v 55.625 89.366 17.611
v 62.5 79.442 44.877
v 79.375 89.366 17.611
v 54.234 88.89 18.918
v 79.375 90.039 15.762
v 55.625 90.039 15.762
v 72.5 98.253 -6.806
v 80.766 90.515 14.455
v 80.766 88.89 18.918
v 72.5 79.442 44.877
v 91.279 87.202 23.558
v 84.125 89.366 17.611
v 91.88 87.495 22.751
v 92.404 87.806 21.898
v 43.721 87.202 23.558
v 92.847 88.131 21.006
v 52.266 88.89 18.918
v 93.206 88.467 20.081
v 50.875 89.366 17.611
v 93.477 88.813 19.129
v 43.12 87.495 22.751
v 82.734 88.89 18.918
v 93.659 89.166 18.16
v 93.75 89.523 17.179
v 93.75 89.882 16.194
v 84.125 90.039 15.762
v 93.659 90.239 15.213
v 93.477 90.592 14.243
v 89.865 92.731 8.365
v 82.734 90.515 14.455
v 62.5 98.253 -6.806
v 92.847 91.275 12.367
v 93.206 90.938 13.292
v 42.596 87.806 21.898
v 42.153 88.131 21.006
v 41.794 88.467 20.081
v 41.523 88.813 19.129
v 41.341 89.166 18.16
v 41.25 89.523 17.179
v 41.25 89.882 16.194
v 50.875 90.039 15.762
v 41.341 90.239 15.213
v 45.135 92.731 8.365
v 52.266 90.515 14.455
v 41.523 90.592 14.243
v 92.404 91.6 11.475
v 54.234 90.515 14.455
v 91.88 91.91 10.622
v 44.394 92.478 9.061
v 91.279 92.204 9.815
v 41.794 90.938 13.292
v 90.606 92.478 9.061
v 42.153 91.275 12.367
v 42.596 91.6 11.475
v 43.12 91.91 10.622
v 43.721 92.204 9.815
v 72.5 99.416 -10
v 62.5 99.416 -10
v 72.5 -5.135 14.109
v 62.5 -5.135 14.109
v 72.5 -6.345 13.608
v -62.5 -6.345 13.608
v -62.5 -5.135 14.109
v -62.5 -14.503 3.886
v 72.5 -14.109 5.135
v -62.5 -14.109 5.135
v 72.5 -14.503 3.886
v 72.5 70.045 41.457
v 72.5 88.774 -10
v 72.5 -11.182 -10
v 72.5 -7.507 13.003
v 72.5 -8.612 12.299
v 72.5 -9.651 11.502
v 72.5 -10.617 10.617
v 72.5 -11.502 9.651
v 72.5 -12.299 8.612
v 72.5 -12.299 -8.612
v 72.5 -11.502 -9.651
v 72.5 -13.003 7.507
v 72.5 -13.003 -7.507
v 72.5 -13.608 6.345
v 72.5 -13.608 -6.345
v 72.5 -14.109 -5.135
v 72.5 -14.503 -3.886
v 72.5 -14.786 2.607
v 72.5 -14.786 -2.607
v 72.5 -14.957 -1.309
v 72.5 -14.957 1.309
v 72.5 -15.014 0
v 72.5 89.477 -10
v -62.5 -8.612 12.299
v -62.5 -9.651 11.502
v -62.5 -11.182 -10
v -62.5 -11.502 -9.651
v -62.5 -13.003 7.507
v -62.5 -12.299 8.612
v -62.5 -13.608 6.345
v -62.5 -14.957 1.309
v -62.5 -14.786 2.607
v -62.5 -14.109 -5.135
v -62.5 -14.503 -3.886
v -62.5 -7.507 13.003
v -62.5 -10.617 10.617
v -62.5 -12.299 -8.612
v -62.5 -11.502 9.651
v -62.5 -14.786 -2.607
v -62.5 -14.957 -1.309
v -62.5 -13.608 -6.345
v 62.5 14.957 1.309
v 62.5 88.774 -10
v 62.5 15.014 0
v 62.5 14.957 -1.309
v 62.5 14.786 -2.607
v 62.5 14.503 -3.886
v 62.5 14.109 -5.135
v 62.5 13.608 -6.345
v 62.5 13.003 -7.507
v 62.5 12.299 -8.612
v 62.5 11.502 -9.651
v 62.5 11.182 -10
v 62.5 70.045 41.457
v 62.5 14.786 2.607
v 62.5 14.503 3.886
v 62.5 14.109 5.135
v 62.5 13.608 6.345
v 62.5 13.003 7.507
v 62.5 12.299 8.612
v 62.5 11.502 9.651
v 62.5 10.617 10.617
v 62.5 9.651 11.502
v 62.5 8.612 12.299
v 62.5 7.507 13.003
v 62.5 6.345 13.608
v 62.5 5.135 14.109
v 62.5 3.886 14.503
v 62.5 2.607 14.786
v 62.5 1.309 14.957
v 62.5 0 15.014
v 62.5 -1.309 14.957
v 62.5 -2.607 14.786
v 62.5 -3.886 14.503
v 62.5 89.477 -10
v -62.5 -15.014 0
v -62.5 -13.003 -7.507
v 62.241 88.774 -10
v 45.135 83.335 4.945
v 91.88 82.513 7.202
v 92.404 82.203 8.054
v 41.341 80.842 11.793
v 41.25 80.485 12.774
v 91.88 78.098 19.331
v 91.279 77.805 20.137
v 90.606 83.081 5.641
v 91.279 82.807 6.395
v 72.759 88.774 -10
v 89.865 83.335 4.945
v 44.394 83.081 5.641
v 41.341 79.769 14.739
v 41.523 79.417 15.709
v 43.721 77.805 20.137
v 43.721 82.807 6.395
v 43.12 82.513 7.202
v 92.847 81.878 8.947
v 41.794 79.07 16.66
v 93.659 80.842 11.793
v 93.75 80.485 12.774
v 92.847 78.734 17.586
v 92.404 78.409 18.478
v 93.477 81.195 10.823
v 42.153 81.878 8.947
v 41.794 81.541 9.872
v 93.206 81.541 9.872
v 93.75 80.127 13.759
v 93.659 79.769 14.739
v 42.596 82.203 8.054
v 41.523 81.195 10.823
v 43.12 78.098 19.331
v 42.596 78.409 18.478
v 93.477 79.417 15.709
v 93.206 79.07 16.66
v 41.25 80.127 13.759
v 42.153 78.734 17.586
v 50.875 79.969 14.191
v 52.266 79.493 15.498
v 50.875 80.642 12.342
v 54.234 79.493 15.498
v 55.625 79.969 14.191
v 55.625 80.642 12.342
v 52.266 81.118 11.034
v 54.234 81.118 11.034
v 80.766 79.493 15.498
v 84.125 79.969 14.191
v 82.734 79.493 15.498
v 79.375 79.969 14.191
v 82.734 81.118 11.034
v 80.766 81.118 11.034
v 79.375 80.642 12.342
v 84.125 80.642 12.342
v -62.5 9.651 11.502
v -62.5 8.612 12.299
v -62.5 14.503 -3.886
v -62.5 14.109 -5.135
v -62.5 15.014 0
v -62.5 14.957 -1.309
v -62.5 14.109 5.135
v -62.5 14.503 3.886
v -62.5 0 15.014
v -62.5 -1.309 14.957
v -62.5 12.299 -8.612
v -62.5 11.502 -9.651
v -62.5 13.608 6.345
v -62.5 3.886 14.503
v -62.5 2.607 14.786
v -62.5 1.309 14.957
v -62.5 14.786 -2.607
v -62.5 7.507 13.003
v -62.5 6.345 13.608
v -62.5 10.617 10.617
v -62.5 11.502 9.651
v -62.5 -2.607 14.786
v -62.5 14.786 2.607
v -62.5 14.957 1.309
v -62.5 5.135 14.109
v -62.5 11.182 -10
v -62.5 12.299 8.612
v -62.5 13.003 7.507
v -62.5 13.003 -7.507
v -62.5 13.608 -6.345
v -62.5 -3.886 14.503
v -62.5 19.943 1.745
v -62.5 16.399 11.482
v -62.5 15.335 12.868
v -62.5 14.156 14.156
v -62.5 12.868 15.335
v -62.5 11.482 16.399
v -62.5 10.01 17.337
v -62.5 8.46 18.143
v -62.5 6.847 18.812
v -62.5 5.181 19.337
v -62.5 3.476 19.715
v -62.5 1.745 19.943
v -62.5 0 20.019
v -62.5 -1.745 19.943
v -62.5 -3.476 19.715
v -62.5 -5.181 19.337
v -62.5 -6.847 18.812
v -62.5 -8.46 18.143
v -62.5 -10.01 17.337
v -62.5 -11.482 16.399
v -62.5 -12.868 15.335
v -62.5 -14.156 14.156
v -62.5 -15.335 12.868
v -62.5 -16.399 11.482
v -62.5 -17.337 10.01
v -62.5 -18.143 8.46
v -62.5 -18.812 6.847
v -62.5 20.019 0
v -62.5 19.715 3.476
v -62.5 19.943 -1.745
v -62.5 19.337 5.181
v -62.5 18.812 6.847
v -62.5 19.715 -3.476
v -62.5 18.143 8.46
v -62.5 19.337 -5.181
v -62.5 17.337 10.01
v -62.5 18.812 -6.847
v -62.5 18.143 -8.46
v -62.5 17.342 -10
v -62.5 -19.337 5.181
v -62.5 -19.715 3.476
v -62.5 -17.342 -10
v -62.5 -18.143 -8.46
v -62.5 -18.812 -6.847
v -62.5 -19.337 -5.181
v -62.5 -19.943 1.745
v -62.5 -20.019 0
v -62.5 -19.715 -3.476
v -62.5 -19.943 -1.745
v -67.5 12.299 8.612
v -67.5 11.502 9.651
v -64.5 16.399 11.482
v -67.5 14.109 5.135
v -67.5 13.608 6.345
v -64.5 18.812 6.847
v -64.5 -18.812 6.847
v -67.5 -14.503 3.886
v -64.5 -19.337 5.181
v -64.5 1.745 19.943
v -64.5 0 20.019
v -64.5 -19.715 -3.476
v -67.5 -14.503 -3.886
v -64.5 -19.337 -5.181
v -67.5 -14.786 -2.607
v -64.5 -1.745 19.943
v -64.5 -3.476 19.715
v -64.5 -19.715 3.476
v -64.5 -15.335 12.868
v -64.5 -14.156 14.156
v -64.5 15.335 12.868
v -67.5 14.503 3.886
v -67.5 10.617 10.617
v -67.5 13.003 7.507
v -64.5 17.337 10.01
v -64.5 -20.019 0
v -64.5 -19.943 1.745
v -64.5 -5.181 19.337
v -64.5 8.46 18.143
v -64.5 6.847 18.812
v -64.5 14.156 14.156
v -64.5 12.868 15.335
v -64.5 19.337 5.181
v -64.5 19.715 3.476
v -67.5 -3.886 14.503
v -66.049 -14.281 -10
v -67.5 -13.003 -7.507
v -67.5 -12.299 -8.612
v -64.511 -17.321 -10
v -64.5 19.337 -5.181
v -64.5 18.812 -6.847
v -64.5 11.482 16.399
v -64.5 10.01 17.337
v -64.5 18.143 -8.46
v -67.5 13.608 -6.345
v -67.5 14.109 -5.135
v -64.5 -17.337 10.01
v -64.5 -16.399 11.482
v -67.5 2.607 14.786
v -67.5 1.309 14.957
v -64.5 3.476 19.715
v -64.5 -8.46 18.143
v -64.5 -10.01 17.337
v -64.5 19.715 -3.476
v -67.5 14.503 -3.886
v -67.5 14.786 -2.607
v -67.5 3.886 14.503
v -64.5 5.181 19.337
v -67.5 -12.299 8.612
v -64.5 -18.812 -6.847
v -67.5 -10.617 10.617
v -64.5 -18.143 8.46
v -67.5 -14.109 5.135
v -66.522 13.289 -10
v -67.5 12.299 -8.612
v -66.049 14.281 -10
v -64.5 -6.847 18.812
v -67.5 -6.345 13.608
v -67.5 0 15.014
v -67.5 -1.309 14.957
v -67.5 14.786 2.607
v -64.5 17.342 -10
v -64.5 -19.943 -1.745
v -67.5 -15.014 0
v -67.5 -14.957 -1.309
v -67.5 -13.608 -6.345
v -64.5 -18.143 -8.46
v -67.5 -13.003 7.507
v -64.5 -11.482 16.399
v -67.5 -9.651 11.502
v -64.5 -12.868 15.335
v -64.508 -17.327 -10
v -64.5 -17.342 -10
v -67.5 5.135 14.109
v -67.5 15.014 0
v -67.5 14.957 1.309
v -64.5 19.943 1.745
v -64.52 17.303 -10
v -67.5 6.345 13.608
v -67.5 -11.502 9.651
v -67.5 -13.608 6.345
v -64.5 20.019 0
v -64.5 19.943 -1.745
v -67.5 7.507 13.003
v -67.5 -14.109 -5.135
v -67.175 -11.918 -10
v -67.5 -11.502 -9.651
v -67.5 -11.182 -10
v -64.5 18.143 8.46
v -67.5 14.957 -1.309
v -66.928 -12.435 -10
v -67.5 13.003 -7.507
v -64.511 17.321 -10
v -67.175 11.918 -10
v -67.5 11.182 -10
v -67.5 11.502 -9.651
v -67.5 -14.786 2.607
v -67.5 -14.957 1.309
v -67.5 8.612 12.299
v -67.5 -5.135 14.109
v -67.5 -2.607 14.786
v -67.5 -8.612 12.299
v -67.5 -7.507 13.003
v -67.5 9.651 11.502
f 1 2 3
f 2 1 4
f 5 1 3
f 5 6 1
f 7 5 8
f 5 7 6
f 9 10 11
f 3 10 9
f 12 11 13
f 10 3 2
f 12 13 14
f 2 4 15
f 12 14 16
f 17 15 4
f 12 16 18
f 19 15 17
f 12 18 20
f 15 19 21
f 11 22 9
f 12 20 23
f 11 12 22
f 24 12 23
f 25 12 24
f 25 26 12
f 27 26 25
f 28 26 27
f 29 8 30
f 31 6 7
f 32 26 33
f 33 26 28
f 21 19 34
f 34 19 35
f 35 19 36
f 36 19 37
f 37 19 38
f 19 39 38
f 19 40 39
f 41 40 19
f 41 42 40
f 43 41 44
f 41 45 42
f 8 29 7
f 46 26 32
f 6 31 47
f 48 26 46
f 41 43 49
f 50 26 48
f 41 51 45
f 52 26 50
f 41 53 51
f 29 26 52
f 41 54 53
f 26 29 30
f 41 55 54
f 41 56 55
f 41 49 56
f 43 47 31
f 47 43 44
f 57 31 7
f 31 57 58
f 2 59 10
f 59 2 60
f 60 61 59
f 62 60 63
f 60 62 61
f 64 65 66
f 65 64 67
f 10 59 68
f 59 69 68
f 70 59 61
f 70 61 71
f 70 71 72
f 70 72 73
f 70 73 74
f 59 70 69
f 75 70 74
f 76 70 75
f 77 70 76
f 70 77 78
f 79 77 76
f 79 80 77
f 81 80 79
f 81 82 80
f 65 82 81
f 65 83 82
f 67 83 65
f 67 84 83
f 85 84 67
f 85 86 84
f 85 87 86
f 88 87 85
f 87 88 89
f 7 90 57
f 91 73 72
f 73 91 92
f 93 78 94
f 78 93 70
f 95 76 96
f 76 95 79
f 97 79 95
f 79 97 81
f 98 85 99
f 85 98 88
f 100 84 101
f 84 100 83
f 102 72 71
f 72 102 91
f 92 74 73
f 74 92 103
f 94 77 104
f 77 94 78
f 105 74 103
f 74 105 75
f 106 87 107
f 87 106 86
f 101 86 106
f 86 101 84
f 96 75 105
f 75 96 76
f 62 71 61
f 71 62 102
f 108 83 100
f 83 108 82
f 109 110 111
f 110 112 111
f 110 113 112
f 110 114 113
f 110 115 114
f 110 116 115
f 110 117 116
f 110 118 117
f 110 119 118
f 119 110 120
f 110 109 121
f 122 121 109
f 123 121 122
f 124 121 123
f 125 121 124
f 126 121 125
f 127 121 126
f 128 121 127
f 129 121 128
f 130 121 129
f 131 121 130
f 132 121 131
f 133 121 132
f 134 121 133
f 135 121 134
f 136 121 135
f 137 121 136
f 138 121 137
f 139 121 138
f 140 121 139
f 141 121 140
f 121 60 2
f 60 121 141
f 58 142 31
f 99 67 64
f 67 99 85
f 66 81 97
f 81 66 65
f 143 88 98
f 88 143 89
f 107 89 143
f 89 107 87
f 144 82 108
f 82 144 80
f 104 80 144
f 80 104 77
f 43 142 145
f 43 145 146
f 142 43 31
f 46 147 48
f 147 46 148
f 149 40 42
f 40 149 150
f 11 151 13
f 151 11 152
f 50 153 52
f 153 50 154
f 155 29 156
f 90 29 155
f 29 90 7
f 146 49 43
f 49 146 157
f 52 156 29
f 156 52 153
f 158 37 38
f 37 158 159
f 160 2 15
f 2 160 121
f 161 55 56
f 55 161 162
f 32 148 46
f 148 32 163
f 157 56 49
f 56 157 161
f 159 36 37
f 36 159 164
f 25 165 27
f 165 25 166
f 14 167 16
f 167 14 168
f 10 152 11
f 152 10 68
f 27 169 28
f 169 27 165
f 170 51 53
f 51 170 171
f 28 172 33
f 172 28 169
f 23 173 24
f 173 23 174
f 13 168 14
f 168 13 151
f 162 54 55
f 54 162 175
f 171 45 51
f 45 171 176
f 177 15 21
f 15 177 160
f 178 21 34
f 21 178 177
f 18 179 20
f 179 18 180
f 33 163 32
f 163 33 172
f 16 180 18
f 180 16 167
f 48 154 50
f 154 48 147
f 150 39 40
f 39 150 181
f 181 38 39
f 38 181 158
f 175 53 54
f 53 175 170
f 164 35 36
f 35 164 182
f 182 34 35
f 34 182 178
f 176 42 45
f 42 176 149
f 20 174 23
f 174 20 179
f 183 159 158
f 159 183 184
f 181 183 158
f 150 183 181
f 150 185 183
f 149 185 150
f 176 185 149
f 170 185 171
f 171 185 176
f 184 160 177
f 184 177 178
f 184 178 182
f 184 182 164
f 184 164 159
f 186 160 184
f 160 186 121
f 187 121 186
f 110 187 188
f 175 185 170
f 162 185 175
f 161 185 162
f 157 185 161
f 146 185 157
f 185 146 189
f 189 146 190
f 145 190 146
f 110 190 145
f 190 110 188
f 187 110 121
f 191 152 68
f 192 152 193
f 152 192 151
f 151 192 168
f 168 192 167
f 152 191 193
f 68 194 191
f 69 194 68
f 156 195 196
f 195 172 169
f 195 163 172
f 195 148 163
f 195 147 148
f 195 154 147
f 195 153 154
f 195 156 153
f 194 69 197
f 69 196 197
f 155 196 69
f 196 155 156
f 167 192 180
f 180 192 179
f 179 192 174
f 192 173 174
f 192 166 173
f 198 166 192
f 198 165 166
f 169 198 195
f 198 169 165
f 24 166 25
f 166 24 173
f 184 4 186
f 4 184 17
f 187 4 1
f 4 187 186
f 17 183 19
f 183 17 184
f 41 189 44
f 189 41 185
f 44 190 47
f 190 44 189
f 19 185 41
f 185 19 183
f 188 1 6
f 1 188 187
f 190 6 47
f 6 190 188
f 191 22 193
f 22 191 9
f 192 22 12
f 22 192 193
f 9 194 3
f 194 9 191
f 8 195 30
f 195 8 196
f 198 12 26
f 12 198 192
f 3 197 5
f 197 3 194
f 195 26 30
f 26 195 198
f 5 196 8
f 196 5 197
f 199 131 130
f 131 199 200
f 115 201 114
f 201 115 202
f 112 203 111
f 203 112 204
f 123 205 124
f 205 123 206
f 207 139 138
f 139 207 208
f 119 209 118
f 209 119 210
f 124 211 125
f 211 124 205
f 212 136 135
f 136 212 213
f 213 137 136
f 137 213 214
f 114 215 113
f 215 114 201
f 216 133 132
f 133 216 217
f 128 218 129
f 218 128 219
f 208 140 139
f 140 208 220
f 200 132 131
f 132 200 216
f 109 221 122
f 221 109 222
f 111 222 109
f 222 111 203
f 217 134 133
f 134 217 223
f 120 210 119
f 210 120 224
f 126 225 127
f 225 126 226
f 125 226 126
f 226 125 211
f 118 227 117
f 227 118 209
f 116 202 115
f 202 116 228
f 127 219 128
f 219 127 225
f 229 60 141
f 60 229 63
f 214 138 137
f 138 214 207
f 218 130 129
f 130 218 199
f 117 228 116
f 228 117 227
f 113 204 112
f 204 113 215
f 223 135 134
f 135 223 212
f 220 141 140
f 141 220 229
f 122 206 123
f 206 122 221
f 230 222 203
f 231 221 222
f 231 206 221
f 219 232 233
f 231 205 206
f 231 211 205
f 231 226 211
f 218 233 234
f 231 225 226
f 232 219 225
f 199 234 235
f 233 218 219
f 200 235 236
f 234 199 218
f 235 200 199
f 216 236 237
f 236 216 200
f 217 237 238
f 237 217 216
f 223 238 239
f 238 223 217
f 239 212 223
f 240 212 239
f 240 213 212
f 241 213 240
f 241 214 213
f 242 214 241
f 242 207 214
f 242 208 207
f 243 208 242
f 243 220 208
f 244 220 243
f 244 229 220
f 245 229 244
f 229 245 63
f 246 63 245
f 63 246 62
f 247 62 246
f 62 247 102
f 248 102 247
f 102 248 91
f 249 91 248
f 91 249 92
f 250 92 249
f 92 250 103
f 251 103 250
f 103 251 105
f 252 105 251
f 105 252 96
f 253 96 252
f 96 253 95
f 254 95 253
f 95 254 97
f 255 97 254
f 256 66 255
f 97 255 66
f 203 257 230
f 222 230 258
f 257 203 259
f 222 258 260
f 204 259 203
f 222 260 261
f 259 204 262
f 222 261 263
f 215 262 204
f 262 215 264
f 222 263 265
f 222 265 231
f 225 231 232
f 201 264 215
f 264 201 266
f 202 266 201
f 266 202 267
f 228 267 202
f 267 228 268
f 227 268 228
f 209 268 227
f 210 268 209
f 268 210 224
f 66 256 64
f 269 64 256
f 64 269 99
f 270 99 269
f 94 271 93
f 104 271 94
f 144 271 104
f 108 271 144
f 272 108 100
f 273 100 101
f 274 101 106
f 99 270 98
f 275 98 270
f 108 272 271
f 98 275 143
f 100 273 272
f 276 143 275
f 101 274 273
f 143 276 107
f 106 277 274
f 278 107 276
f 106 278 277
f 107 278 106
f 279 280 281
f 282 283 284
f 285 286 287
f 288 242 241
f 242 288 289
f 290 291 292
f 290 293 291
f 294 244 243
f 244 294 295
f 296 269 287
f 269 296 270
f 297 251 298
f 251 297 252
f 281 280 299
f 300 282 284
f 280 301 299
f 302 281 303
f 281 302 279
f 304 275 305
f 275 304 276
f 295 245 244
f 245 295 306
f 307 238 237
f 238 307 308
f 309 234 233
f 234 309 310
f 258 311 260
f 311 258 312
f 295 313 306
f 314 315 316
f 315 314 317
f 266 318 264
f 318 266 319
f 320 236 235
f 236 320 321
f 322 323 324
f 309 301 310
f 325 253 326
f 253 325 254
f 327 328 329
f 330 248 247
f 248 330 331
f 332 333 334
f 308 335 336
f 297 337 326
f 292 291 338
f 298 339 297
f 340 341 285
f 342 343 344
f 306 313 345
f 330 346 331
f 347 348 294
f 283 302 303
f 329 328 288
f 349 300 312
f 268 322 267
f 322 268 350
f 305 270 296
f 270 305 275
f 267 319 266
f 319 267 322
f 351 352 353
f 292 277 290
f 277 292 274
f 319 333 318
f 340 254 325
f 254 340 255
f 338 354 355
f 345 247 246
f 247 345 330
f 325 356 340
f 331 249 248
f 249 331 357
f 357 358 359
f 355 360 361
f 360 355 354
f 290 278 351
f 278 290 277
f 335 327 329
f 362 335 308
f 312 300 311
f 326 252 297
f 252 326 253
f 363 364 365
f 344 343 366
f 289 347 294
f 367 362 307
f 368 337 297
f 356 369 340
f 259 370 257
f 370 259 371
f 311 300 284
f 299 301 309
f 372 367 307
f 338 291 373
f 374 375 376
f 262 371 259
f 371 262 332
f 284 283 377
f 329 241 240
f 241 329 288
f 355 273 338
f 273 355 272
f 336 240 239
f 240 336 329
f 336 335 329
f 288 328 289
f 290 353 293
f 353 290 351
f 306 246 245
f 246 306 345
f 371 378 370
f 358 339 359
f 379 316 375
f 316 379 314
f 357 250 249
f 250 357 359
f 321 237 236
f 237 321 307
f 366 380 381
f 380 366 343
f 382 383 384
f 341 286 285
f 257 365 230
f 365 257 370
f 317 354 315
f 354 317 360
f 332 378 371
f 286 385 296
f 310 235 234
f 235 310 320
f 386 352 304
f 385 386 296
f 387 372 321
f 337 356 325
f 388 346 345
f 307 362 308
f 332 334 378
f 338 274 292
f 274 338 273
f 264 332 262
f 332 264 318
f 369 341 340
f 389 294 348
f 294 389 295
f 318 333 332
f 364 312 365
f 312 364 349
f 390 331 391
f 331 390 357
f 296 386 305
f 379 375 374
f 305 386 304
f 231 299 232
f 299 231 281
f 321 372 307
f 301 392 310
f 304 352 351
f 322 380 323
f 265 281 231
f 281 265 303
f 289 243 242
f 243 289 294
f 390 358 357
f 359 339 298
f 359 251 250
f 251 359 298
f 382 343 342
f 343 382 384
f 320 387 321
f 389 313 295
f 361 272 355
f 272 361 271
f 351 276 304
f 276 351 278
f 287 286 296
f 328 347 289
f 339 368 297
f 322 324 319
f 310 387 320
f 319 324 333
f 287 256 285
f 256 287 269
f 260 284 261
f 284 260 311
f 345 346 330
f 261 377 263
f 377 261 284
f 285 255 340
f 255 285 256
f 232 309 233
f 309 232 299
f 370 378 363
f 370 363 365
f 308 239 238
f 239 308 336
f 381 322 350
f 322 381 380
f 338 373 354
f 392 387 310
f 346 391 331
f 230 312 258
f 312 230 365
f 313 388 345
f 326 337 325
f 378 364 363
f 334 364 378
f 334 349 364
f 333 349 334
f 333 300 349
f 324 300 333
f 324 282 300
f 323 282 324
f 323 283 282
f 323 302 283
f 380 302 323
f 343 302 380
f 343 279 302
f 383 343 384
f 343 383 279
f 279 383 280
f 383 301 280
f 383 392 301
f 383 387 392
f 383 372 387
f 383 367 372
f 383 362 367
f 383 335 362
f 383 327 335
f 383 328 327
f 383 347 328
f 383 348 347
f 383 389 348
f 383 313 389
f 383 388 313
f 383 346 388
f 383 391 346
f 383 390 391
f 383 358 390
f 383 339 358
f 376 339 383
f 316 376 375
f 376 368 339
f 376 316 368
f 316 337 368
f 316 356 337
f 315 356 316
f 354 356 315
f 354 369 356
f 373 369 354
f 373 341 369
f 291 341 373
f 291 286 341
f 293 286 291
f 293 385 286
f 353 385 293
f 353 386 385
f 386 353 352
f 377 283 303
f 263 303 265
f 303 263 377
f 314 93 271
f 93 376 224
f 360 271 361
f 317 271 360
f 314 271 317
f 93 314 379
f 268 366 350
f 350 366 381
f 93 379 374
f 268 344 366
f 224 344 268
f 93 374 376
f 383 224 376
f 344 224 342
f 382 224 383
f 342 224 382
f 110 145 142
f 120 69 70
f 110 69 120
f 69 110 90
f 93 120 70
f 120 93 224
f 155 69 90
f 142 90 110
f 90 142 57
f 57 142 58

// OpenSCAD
resolution = 36;
resolution = 72;

roll_inner = 40;
roll_outer = 130;
roll_len = 125;

retainer_rim_height = 5;
retainer_rim_thickness = 5;
retainer_rim_edge_thickness = 2;
wall_clearance = 10;

tube_support_diam = roll_inner - retainer_rim_height*2;

left = -1;
right = 1;

inside = -1;
outside = 1;

arm_side      = left;
arm_side      = right;
arm_angle     = 20;
arm_thickness = 10;

arm_pos_x = (roll_len/2+arm_thickness/2)*arm_side;
retainer_pos_x = (roll_len/2+retainer_rim_thickness/2)*arm_side*-1;

mount_plate_screw_spacing = 28.5;
mount_plate_screw_diam = 4.75;
mount_plate_screw_head_diam = 24;
mount_plate_height = 60;
mount_plate_width = mount_plate_screw_spacing+mount_plate_screw_head_diam;
mount_plate_thickness = 10;

mount_plate_pos_z = tube_support_diam/2-mount_plate_height/2;
dist_from_wall = roll_outer/2 + wall_clearance + mount_plate_thickness;

module accurate_hole(diam, height, sides=8) {
  r = 1 / cos(180/sides) / 2 * diam;

  cylinder(r=r,h=height,center=true,$fn=sides);
}

module roll_holder() {
  rotate([0,90,0])
    accurate_hole(tube_support_diam,roll_len,resolution);

  translate([retainer_pos_x,0,0]) {
    rotate([0,90,0])
      hull() {
        accurate_hole(tube_support_diam,retainer_rim_thickness,resolution);

        translate([0,0,(retainer_rim_thickness/2-retainer_rim_edge_thickness/2)*arm_side])
          accurate_hole(roll_inner,retainer_rim_edge_thickness,resolution);
      }
  }

  translate([arm_pos_x,0,0]) {
    support_arm();
  }
}

module support_arm() {
  module body() {
    hull() {
      rotate([0,90,0])
        accurate_hole(tube_support_diam,arm_thickness,resolution);

      translate([0,dist_from_wall,mount_plate_pos_z]) {
        cube([arm_thickness,mount_plate_thickness,mount_plate_height],center=true);
      }
    }

    hull() {
      translate([0,dist_from_wall,mount_plate_pos_z+2.5]) {
        cube([arm_thickness,mount_plate_thickness,mount_plate_height-5],center=true);
      }

      for(side=[left,right]) {
        translate([mount_plate_screw_spacing/2*side,dist_from_wall,mount_plate_pos_z]) {
          rotate([90,0,0]) rotate([0,0,22.5])
            accurate_hole(mount_plate_screw_head_diam,mount_plate_thickness,resolution);
        }
      }
    }
  }

  module holes() {
    for(side=[left,right]) {
      translate([mount_plate_screw_spacing/2*side,dist_from_wall,mount_plate_pos_z]) rotate([90,0,0]) rotate([0,0,22.5])
        accurate_hole(mount_plate_screw_diam,mount_plate_thickness+1,8);
    }
  }

  difference() {
    body();
    holes();
  }
}

module assembly() {
  difference() {
    rotate([arm_angle,0,0]) roll_holder();
    translate([0,0,-60]) cube([roll_len*3,dist_from_wall*3,100],center=true);
  }
}

//rotate([-arm_angle,0,0])
  assembly();
